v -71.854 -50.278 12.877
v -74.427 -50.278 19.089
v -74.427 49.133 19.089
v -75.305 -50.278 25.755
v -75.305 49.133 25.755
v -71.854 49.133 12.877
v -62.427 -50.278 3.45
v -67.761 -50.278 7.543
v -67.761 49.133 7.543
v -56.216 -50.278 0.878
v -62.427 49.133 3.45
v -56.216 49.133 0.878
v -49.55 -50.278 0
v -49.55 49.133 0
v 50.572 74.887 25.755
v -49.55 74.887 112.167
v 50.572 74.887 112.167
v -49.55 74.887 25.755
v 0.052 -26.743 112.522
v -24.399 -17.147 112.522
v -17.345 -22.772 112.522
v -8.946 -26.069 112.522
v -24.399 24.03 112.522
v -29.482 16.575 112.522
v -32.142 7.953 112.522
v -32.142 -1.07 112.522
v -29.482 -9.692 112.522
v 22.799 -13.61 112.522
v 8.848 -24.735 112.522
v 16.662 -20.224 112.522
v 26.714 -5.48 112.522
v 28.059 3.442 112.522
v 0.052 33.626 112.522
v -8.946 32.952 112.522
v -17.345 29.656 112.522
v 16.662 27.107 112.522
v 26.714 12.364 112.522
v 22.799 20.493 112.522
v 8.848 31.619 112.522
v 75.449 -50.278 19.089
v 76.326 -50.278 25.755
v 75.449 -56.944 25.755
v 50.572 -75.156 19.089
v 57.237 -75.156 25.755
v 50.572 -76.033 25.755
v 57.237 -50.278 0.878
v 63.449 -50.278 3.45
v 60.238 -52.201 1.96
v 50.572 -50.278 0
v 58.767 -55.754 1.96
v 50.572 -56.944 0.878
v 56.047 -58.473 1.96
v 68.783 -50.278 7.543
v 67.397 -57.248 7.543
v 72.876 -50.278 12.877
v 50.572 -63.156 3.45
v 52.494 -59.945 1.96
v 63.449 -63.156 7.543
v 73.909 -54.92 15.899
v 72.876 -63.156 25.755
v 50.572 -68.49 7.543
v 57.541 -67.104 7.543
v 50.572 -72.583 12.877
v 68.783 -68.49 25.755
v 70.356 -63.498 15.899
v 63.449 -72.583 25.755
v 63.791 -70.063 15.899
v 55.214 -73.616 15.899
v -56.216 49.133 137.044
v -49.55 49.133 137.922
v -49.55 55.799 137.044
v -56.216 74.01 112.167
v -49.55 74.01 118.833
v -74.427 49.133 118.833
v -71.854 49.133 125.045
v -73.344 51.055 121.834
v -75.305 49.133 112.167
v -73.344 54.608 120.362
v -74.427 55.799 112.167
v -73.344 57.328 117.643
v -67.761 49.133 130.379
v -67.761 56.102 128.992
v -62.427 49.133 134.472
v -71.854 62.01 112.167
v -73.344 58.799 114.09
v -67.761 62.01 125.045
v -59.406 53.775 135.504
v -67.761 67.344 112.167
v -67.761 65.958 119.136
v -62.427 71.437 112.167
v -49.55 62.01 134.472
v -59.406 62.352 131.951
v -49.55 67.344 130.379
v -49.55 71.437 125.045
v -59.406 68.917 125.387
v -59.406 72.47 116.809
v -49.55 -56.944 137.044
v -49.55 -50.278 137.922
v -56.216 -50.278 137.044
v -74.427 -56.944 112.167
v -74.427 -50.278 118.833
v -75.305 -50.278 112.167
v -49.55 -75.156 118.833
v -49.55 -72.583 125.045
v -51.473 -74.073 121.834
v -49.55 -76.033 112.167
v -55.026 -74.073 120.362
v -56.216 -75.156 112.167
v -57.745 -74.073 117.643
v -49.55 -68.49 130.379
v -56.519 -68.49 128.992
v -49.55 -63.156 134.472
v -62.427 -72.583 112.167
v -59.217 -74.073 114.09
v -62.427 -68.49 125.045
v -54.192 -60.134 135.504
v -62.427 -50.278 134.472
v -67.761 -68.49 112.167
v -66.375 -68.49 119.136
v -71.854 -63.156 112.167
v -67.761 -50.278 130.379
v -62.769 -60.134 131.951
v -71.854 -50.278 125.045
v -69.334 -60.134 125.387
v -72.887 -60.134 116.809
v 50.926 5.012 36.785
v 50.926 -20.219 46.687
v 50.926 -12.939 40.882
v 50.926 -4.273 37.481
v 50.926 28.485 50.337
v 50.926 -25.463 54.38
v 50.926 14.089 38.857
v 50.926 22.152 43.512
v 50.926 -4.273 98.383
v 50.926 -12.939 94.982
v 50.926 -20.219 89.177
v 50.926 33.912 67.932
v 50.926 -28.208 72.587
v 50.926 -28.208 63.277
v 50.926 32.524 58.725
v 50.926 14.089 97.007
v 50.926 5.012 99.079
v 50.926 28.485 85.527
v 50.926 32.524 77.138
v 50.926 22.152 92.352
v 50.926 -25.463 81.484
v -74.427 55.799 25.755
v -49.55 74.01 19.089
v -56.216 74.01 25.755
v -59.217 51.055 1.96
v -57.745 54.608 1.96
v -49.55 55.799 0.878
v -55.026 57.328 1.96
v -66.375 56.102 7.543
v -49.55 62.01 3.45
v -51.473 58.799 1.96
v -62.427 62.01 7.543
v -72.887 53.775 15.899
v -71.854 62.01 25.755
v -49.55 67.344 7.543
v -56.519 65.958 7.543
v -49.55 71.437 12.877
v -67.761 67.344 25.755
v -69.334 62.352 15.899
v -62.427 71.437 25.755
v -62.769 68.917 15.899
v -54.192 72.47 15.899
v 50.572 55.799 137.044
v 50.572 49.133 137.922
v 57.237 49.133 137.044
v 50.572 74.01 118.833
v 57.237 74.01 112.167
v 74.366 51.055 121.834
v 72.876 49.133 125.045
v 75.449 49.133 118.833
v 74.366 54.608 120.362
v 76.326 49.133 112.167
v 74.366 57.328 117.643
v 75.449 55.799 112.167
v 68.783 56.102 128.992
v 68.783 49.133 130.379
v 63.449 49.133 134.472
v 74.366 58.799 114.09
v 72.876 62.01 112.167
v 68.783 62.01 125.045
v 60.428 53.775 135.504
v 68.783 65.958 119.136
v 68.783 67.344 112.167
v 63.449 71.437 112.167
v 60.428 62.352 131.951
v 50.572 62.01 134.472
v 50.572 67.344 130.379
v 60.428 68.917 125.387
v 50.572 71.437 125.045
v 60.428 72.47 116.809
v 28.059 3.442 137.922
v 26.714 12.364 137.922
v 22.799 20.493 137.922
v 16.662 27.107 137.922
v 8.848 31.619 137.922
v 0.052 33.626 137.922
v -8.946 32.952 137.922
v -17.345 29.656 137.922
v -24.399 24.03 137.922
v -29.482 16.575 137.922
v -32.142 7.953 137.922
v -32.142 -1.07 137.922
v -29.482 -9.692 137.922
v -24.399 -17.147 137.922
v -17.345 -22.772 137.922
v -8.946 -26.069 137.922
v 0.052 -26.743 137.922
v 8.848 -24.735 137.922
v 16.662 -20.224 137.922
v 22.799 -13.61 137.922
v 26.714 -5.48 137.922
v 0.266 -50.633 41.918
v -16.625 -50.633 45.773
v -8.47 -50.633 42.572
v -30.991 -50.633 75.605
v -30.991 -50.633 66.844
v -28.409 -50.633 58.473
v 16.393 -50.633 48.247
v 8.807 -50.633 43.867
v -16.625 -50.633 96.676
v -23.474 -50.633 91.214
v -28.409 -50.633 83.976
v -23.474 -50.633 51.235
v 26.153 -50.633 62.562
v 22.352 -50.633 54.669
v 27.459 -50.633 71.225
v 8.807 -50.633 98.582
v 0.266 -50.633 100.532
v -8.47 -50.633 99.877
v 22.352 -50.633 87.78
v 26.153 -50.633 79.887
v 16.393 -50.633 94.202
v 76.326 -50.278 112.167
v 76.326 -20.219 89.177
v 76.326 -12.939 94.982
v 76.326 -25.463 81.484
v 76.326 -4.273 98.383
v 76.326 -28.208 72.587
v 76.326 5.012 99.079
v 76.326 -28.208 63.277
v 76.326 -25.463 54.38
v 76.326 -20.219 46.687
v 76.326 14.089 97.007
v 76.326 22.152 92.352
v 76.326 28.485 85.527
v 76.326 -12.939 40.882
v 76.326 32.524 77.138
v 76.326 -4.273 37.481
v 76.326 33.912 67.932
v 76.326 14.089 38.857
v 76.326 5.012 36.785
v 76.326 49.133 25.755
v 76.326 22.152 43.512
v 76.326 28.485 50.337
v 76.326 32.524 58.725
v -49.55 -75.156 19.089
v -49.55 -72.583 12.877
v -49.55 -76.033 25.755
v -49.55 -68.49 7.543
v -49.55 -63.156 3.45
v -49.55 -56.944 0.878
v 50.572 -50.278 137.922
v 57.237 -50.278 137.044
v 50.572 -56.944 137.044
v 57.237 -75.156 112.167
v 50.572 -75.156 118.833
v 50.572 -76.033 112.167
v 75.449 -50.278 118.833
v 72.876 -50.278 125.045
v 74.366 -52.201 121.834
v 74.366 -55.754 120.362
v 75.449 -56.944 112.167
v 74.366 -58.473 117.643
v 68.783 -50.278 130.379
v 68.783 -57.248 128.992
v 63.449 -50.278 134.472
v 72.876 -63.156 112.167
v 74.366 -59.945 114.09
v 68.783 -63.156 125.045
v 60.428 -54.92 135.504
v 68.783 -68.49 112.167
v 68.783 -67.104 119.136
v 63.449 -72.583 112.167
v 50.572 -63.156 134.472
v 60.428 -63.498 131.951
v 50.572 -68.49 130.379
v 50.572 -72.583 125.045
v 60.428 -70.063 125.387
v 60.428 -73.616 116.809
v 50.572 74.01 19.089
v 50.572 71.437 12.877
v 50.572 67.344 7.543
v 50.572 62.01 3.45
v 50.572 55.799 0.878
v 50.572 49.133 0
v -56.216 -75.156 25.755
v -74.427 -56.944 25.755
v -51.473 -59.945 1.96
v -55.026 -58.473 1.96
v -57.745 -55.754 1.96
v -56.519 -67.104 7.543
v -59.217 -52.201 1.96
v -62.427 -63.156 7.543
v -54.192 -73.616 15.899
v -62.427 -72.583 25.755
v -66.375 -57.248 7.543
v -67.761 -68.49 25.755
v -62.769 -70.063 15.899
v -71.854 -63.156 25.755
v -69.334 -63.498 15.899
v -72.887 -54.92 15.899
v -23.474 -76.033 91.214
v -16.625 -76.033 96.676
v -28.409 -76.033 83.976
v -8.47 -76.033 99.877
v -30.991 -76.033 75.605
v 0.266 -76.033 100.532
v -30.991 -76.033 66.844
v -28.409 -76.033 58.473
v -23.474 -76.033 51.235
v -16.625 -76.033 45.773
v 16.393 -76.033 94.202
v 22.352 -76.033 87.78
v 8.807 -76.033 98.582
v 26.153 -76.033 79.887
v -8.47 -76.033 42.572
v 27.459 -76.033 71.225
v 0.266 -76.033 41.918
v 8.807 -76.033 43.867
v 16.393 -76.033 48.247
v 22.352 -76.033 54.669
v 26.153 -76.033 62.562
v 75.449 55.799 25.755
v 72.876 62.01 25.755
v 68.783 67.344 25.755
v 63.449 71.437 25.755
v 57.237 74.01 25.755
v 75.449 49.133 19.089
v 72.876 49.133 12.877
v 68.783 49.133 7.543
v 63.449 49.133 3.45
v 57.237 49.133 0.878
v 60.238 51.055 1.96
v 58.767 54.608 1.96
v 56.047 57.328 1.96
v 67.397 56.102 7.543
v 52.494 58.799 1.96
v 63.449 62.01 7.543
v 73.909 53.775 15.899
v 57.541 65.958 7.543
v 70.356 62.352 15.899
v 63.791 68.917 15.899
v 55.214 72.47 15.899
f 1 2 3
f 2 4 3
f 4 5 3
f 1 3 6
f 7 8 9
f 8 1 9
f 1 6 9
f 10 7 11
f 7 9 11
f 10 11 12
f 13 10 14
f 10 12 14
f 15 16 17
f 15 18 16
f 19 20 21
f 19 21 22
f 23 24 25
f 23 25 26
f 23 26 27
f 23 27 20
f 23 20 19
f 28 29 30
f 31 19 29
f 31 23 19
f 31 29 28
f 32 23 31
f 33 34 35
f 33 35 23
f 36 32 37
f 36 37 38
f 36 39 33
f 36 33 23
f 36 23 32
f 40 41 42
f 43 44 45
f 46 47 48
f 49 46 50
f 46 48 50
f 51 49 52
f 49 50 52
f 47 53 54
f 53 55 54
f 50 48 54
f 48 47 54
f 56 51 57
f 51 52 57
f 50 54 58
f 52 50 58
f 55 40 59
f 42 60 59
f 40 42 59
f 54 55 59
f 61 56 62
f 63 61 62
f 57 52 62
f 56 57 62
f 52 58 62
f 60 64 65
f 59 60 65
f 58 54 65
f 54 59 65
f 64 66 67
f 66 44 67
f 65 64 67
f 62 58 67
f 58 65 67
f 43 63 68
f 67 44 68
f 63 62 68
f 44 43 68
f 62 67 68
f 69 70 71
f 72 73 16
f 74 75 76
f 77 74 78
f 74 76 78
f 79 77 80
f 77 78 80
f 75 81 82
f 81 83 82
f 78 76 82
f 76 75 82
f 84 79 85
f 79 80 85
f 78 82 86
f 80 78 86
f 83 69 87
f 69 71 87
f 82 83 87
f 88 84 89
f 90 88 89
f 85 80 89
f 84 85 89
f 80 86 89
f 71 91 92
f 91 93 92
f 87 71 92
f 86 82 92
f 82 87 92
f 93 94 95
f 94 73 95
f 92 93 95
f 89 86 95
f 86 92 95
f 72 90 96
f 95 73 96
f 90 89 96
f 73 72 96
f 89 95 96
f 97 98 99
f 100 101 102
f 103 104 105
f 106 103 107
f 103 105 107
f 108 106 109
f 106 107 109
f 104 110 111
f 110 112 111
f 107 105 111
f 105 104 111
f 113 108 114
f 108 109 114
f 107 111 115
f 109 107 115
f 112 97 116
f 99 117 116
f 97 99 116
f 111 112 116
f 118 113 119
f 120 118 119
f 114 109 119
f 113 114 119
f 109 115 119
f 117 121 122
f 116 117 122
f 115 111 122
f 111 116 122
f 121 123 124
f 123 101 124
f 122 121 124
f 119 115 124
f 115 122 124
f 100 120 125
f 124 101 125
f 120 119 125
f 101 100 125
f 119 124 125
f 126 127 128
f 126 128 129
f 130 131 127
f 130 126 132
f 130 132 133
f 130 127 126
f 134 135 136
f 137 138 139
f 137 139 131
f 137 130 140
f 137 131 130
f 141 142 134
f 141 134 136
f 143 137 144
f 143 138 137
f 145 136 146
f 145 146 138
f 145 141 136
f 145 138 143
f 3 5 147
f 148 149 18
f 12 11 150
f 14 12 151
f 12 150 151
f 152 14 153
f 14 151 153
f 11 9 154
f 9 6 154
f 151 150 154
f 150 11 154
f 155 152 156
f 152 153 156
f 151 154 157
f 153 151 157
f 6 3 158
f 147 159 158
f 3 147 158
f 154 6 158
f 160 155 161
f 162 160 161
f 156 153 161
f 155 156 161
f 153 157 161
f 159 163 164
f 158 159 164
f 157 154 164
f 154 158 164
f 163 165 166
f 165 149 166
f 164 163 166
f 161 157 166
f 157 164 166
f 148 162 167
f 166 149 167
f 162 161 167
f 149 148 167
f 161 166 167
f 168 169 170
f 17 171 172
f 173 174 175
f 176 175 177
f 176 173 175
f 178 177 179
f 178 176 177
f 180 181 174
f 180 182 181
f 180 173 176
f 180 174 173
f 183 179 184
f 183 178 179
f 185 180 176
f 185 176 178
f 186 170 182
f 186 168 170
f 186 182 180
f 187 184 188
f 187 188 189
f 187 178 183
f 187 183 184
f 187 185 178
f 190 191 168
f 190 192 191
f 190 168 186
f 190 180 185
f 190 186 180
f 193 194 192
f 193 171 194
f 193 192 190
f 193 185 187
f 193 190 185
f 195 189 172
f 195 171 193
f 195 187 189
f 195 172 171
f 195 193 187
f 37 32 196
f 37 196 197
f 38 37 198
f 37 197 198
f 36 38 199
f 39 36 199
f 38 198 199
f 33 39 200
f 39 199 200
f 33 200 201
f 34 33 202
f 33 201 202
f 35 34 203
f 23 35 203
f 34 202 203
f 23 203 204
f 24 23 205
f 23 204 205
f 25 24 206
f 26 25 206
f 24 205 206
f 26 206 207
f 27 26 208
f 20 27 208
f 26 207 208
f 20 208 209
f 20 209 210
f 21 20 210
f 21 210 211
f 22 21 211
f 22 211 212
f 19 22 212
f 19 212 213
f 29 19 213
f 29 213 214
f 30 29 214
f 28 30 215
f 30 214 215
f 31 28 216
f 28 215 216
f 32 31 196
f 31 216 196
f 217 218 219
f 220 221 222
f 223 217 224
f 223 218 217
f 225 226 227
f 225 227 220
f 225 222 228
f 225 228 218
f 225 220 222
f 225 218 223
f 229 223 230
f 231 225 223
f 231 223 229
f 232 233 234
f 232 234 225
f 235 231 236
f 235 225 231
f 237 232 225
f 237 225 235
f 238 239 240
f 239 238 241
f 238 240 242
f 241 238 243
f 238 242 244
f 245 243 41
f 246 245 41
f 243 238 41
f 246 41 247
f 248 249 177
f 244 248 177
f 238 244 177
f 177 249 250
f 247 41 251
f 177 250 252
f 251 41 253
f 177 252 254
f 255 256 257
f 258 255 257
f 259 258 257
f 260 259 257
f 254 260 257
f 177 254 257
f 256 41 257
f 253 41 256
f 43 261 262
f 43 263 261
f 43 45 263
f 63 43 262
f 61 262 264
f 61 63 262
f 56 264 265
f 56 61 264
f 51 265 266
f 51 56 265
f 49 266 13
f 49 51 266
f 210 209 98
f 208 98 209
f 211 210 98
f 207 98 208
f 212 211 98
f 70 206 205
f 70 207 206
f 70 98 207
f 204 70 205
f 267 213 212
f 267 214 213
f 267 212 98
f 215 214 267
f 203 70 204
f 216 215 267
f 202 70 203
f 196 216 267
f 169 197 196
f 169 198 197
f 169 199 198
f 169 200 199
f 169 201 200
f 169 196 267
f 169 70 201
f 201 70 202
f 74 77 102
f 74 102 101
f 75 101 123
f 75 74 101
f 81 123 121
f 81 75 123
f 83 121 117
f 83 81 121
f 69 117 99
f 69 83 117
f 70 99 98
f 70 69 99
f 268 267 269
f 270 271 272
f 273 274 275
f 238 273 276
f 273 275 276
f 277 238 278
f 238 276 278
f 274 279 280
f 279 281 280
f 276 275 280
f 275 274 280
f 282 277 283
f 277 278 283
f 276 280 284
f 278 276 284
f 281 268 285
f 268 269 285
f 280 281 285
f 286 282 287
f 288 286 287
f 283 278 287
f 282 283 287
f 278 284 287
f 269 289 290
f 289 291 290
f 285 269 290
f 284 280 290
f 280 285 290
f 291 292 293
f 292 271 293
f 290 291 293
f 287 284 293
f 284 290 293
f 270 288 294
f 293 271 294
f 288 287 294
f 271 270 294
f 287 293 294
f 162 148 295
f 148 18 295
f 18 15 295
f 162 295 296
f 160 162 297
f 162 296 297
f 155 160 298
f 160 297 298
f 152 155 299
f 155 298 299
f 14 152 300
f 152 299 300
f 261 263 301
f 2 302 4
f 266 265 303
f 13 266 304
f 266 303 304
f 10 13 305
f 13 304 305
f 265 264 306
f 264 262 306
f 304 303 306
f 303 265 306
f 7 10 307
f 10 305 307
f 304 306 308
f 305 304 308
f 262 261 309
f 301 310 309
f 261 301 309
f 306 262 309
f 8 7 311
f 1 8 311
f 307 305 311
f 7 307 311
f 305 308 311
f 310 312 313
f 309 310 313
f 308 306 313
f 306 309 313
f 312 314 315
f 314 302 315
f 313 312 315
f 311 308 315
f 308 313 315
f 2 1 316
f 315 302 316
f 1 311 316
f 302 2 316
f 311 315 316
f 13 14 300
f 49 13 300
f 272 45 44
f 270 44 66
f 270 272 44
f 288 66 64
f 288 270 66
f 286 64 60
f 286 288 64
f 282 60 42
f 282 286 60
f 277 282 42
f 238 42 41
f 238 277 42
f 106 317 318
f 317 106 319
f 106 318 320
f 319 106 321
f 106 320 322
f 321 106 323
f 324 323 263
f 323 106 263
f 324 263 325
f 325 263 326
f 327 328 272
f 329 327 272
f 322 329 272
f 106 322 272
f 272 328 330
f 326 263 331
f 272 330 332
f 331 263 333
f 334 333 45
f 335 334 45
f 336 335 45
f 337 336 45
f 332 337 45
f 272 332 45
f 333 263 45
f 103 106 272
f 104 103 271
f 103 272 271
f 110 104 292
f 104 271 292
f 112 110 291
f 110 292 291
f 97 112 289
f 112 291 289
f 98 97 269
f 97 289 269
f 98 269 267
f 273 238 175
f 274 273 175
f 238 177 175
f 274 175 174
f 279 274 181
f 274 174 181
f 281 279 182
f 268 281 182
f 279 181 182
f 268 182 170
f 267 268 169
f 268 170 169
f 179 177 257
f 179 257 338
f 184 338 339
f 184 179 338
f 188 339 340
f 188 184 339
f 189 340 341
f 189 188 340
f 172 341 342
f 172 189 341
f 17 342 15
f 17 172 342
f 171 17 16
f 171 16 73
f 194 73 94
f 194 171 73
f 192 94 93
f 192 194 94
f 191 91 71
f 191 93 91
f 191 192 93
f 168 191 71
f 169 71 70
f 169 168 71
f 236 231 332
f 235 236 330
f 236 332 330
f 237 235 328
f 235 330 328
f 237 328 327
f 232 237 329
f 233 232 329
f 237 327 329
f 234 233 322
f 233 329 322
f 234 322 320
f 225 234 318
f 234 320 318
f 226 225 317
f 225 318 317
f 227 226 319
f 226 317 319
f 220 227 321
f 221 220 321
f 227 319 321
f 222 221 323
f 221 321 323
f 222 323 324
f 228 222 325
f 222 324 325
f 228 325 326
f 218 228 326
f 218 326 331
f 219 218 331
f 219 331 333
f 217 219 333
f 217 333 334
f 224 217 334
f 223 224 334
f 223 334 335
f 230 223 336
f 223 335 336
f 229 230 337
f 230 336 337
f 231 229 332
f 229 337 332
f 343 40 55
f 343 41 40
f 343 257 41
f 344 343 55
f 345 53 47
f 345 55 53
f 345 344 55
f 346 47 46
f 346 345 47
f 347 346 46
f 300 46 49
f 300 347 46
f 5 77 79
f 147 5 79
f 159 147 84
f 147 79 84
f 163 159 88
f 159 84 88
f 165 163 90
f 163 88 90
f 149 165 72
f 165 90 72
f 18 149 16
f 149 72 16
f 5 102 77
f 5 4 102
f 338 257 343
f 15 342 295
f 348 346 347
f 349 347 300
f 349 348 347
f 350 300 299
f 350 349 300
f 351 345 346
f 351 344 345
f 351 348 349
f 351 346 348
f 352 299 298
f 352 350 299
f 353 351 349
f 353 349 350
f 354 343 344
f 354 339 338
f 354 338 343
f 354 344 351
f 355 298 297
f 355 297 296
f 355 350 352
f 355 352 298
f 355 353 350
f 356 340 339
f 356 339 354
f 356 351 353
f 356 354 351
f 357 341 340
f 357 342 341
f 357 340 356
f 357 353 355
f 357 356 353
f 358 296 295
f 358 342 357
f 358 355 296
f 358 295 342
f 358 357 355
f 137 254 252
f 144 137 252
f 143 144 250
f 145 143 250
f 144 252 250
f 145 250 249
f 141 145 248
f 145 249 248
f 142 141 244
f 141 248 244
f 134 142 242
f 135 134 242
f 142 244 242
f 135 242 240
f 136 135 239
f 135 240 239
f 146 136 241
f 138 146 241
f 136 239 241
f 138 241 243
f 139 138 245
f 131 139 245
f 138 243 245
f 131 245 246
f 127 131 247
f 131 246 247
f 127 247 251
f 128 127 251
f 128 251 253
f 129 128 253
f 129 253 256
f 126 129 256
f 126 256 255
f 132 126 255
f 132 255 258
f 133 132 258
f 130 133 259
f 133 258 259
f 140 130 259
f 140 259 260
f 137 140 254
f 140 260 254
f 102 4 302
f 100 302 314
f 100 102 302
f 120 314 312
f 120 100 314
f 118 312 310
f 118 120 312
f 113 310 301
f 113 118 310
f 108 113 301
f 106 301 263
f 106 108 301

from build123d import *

# Parameters (mm, degrees)
F0_W     = 151.631288
F0_H     = 150.920756
F1_DEPTH = 137.922
F2_R     = 25.75483
F3_R     = 30.269305
F4_DEPTH = 25.4
F5_R     = 29.389096
F6_DEPTH = 25.4
F7_R     = 31.234323
F8_DEPTH = 25.4


with BuildPart() as f1:
    # F0 (on Top) → F1 (new body)
    with BuildSketch(Plane.XY):
        with Locations((0.510808, -0.572886)):
            Rectangle(F0_W, F0_H)
    extrude(amount=F1_DEPTH)

    # F2
    f2_edges = [f1.edges().sort_by_distance(p)[0] for p in [
        (0.510808, 74.887492, 137.922),
        (-75.304836, -0.572886, 137.922),
        (0.510808, -76.033264, 137.922),
        (76.326452, -0.572886, 137.922),
        (76.326452, -76.033264, 68.961),
        (76.326452, 74.887492, 68.961),
        (76.326452, -0.572886, 0),
        (-75.304836, -76.033264, 68.961),
        (0.510808, -76.033264, 0),
        (-75.304836, 74.887492, 68.961),
        (-75.304836, -0.572886, 0),
        (0.510808, 74.887492, 0),
    ]]
    fillet(f2_edges, radius=F2_R)

    # F3 (on face) → F4 (cut)
    with BuildSketch(Plane.XY.offset(137.922)):
        with Locations((-2.210455, 3.441766)):
            Circle(F3_R)
    extrude(amount=-F4_DEPTH, mode=Mode.SUBTRACT)

    # F5 (on face) → F6 (cut)
    with BuildSketch(Plane.XZ.offset(76.033264)):
        with Locations((-1.93036, 71.224585)):
            Circle(F5_R)
    extrude(amount=-F6_DEPTH, mode=Mode.SUBTRACT)

    # F7 (on face) → F8 (cut)
    with BuildSketch(Plane.YZ.offset(76.326452)):
        with Locations((2.6777, 67.931794)):
            Circle(F7_R)
    extrude(amount=-F8_DEPTH, mode=Mode.SUBTRACT)


solid = f1.part
